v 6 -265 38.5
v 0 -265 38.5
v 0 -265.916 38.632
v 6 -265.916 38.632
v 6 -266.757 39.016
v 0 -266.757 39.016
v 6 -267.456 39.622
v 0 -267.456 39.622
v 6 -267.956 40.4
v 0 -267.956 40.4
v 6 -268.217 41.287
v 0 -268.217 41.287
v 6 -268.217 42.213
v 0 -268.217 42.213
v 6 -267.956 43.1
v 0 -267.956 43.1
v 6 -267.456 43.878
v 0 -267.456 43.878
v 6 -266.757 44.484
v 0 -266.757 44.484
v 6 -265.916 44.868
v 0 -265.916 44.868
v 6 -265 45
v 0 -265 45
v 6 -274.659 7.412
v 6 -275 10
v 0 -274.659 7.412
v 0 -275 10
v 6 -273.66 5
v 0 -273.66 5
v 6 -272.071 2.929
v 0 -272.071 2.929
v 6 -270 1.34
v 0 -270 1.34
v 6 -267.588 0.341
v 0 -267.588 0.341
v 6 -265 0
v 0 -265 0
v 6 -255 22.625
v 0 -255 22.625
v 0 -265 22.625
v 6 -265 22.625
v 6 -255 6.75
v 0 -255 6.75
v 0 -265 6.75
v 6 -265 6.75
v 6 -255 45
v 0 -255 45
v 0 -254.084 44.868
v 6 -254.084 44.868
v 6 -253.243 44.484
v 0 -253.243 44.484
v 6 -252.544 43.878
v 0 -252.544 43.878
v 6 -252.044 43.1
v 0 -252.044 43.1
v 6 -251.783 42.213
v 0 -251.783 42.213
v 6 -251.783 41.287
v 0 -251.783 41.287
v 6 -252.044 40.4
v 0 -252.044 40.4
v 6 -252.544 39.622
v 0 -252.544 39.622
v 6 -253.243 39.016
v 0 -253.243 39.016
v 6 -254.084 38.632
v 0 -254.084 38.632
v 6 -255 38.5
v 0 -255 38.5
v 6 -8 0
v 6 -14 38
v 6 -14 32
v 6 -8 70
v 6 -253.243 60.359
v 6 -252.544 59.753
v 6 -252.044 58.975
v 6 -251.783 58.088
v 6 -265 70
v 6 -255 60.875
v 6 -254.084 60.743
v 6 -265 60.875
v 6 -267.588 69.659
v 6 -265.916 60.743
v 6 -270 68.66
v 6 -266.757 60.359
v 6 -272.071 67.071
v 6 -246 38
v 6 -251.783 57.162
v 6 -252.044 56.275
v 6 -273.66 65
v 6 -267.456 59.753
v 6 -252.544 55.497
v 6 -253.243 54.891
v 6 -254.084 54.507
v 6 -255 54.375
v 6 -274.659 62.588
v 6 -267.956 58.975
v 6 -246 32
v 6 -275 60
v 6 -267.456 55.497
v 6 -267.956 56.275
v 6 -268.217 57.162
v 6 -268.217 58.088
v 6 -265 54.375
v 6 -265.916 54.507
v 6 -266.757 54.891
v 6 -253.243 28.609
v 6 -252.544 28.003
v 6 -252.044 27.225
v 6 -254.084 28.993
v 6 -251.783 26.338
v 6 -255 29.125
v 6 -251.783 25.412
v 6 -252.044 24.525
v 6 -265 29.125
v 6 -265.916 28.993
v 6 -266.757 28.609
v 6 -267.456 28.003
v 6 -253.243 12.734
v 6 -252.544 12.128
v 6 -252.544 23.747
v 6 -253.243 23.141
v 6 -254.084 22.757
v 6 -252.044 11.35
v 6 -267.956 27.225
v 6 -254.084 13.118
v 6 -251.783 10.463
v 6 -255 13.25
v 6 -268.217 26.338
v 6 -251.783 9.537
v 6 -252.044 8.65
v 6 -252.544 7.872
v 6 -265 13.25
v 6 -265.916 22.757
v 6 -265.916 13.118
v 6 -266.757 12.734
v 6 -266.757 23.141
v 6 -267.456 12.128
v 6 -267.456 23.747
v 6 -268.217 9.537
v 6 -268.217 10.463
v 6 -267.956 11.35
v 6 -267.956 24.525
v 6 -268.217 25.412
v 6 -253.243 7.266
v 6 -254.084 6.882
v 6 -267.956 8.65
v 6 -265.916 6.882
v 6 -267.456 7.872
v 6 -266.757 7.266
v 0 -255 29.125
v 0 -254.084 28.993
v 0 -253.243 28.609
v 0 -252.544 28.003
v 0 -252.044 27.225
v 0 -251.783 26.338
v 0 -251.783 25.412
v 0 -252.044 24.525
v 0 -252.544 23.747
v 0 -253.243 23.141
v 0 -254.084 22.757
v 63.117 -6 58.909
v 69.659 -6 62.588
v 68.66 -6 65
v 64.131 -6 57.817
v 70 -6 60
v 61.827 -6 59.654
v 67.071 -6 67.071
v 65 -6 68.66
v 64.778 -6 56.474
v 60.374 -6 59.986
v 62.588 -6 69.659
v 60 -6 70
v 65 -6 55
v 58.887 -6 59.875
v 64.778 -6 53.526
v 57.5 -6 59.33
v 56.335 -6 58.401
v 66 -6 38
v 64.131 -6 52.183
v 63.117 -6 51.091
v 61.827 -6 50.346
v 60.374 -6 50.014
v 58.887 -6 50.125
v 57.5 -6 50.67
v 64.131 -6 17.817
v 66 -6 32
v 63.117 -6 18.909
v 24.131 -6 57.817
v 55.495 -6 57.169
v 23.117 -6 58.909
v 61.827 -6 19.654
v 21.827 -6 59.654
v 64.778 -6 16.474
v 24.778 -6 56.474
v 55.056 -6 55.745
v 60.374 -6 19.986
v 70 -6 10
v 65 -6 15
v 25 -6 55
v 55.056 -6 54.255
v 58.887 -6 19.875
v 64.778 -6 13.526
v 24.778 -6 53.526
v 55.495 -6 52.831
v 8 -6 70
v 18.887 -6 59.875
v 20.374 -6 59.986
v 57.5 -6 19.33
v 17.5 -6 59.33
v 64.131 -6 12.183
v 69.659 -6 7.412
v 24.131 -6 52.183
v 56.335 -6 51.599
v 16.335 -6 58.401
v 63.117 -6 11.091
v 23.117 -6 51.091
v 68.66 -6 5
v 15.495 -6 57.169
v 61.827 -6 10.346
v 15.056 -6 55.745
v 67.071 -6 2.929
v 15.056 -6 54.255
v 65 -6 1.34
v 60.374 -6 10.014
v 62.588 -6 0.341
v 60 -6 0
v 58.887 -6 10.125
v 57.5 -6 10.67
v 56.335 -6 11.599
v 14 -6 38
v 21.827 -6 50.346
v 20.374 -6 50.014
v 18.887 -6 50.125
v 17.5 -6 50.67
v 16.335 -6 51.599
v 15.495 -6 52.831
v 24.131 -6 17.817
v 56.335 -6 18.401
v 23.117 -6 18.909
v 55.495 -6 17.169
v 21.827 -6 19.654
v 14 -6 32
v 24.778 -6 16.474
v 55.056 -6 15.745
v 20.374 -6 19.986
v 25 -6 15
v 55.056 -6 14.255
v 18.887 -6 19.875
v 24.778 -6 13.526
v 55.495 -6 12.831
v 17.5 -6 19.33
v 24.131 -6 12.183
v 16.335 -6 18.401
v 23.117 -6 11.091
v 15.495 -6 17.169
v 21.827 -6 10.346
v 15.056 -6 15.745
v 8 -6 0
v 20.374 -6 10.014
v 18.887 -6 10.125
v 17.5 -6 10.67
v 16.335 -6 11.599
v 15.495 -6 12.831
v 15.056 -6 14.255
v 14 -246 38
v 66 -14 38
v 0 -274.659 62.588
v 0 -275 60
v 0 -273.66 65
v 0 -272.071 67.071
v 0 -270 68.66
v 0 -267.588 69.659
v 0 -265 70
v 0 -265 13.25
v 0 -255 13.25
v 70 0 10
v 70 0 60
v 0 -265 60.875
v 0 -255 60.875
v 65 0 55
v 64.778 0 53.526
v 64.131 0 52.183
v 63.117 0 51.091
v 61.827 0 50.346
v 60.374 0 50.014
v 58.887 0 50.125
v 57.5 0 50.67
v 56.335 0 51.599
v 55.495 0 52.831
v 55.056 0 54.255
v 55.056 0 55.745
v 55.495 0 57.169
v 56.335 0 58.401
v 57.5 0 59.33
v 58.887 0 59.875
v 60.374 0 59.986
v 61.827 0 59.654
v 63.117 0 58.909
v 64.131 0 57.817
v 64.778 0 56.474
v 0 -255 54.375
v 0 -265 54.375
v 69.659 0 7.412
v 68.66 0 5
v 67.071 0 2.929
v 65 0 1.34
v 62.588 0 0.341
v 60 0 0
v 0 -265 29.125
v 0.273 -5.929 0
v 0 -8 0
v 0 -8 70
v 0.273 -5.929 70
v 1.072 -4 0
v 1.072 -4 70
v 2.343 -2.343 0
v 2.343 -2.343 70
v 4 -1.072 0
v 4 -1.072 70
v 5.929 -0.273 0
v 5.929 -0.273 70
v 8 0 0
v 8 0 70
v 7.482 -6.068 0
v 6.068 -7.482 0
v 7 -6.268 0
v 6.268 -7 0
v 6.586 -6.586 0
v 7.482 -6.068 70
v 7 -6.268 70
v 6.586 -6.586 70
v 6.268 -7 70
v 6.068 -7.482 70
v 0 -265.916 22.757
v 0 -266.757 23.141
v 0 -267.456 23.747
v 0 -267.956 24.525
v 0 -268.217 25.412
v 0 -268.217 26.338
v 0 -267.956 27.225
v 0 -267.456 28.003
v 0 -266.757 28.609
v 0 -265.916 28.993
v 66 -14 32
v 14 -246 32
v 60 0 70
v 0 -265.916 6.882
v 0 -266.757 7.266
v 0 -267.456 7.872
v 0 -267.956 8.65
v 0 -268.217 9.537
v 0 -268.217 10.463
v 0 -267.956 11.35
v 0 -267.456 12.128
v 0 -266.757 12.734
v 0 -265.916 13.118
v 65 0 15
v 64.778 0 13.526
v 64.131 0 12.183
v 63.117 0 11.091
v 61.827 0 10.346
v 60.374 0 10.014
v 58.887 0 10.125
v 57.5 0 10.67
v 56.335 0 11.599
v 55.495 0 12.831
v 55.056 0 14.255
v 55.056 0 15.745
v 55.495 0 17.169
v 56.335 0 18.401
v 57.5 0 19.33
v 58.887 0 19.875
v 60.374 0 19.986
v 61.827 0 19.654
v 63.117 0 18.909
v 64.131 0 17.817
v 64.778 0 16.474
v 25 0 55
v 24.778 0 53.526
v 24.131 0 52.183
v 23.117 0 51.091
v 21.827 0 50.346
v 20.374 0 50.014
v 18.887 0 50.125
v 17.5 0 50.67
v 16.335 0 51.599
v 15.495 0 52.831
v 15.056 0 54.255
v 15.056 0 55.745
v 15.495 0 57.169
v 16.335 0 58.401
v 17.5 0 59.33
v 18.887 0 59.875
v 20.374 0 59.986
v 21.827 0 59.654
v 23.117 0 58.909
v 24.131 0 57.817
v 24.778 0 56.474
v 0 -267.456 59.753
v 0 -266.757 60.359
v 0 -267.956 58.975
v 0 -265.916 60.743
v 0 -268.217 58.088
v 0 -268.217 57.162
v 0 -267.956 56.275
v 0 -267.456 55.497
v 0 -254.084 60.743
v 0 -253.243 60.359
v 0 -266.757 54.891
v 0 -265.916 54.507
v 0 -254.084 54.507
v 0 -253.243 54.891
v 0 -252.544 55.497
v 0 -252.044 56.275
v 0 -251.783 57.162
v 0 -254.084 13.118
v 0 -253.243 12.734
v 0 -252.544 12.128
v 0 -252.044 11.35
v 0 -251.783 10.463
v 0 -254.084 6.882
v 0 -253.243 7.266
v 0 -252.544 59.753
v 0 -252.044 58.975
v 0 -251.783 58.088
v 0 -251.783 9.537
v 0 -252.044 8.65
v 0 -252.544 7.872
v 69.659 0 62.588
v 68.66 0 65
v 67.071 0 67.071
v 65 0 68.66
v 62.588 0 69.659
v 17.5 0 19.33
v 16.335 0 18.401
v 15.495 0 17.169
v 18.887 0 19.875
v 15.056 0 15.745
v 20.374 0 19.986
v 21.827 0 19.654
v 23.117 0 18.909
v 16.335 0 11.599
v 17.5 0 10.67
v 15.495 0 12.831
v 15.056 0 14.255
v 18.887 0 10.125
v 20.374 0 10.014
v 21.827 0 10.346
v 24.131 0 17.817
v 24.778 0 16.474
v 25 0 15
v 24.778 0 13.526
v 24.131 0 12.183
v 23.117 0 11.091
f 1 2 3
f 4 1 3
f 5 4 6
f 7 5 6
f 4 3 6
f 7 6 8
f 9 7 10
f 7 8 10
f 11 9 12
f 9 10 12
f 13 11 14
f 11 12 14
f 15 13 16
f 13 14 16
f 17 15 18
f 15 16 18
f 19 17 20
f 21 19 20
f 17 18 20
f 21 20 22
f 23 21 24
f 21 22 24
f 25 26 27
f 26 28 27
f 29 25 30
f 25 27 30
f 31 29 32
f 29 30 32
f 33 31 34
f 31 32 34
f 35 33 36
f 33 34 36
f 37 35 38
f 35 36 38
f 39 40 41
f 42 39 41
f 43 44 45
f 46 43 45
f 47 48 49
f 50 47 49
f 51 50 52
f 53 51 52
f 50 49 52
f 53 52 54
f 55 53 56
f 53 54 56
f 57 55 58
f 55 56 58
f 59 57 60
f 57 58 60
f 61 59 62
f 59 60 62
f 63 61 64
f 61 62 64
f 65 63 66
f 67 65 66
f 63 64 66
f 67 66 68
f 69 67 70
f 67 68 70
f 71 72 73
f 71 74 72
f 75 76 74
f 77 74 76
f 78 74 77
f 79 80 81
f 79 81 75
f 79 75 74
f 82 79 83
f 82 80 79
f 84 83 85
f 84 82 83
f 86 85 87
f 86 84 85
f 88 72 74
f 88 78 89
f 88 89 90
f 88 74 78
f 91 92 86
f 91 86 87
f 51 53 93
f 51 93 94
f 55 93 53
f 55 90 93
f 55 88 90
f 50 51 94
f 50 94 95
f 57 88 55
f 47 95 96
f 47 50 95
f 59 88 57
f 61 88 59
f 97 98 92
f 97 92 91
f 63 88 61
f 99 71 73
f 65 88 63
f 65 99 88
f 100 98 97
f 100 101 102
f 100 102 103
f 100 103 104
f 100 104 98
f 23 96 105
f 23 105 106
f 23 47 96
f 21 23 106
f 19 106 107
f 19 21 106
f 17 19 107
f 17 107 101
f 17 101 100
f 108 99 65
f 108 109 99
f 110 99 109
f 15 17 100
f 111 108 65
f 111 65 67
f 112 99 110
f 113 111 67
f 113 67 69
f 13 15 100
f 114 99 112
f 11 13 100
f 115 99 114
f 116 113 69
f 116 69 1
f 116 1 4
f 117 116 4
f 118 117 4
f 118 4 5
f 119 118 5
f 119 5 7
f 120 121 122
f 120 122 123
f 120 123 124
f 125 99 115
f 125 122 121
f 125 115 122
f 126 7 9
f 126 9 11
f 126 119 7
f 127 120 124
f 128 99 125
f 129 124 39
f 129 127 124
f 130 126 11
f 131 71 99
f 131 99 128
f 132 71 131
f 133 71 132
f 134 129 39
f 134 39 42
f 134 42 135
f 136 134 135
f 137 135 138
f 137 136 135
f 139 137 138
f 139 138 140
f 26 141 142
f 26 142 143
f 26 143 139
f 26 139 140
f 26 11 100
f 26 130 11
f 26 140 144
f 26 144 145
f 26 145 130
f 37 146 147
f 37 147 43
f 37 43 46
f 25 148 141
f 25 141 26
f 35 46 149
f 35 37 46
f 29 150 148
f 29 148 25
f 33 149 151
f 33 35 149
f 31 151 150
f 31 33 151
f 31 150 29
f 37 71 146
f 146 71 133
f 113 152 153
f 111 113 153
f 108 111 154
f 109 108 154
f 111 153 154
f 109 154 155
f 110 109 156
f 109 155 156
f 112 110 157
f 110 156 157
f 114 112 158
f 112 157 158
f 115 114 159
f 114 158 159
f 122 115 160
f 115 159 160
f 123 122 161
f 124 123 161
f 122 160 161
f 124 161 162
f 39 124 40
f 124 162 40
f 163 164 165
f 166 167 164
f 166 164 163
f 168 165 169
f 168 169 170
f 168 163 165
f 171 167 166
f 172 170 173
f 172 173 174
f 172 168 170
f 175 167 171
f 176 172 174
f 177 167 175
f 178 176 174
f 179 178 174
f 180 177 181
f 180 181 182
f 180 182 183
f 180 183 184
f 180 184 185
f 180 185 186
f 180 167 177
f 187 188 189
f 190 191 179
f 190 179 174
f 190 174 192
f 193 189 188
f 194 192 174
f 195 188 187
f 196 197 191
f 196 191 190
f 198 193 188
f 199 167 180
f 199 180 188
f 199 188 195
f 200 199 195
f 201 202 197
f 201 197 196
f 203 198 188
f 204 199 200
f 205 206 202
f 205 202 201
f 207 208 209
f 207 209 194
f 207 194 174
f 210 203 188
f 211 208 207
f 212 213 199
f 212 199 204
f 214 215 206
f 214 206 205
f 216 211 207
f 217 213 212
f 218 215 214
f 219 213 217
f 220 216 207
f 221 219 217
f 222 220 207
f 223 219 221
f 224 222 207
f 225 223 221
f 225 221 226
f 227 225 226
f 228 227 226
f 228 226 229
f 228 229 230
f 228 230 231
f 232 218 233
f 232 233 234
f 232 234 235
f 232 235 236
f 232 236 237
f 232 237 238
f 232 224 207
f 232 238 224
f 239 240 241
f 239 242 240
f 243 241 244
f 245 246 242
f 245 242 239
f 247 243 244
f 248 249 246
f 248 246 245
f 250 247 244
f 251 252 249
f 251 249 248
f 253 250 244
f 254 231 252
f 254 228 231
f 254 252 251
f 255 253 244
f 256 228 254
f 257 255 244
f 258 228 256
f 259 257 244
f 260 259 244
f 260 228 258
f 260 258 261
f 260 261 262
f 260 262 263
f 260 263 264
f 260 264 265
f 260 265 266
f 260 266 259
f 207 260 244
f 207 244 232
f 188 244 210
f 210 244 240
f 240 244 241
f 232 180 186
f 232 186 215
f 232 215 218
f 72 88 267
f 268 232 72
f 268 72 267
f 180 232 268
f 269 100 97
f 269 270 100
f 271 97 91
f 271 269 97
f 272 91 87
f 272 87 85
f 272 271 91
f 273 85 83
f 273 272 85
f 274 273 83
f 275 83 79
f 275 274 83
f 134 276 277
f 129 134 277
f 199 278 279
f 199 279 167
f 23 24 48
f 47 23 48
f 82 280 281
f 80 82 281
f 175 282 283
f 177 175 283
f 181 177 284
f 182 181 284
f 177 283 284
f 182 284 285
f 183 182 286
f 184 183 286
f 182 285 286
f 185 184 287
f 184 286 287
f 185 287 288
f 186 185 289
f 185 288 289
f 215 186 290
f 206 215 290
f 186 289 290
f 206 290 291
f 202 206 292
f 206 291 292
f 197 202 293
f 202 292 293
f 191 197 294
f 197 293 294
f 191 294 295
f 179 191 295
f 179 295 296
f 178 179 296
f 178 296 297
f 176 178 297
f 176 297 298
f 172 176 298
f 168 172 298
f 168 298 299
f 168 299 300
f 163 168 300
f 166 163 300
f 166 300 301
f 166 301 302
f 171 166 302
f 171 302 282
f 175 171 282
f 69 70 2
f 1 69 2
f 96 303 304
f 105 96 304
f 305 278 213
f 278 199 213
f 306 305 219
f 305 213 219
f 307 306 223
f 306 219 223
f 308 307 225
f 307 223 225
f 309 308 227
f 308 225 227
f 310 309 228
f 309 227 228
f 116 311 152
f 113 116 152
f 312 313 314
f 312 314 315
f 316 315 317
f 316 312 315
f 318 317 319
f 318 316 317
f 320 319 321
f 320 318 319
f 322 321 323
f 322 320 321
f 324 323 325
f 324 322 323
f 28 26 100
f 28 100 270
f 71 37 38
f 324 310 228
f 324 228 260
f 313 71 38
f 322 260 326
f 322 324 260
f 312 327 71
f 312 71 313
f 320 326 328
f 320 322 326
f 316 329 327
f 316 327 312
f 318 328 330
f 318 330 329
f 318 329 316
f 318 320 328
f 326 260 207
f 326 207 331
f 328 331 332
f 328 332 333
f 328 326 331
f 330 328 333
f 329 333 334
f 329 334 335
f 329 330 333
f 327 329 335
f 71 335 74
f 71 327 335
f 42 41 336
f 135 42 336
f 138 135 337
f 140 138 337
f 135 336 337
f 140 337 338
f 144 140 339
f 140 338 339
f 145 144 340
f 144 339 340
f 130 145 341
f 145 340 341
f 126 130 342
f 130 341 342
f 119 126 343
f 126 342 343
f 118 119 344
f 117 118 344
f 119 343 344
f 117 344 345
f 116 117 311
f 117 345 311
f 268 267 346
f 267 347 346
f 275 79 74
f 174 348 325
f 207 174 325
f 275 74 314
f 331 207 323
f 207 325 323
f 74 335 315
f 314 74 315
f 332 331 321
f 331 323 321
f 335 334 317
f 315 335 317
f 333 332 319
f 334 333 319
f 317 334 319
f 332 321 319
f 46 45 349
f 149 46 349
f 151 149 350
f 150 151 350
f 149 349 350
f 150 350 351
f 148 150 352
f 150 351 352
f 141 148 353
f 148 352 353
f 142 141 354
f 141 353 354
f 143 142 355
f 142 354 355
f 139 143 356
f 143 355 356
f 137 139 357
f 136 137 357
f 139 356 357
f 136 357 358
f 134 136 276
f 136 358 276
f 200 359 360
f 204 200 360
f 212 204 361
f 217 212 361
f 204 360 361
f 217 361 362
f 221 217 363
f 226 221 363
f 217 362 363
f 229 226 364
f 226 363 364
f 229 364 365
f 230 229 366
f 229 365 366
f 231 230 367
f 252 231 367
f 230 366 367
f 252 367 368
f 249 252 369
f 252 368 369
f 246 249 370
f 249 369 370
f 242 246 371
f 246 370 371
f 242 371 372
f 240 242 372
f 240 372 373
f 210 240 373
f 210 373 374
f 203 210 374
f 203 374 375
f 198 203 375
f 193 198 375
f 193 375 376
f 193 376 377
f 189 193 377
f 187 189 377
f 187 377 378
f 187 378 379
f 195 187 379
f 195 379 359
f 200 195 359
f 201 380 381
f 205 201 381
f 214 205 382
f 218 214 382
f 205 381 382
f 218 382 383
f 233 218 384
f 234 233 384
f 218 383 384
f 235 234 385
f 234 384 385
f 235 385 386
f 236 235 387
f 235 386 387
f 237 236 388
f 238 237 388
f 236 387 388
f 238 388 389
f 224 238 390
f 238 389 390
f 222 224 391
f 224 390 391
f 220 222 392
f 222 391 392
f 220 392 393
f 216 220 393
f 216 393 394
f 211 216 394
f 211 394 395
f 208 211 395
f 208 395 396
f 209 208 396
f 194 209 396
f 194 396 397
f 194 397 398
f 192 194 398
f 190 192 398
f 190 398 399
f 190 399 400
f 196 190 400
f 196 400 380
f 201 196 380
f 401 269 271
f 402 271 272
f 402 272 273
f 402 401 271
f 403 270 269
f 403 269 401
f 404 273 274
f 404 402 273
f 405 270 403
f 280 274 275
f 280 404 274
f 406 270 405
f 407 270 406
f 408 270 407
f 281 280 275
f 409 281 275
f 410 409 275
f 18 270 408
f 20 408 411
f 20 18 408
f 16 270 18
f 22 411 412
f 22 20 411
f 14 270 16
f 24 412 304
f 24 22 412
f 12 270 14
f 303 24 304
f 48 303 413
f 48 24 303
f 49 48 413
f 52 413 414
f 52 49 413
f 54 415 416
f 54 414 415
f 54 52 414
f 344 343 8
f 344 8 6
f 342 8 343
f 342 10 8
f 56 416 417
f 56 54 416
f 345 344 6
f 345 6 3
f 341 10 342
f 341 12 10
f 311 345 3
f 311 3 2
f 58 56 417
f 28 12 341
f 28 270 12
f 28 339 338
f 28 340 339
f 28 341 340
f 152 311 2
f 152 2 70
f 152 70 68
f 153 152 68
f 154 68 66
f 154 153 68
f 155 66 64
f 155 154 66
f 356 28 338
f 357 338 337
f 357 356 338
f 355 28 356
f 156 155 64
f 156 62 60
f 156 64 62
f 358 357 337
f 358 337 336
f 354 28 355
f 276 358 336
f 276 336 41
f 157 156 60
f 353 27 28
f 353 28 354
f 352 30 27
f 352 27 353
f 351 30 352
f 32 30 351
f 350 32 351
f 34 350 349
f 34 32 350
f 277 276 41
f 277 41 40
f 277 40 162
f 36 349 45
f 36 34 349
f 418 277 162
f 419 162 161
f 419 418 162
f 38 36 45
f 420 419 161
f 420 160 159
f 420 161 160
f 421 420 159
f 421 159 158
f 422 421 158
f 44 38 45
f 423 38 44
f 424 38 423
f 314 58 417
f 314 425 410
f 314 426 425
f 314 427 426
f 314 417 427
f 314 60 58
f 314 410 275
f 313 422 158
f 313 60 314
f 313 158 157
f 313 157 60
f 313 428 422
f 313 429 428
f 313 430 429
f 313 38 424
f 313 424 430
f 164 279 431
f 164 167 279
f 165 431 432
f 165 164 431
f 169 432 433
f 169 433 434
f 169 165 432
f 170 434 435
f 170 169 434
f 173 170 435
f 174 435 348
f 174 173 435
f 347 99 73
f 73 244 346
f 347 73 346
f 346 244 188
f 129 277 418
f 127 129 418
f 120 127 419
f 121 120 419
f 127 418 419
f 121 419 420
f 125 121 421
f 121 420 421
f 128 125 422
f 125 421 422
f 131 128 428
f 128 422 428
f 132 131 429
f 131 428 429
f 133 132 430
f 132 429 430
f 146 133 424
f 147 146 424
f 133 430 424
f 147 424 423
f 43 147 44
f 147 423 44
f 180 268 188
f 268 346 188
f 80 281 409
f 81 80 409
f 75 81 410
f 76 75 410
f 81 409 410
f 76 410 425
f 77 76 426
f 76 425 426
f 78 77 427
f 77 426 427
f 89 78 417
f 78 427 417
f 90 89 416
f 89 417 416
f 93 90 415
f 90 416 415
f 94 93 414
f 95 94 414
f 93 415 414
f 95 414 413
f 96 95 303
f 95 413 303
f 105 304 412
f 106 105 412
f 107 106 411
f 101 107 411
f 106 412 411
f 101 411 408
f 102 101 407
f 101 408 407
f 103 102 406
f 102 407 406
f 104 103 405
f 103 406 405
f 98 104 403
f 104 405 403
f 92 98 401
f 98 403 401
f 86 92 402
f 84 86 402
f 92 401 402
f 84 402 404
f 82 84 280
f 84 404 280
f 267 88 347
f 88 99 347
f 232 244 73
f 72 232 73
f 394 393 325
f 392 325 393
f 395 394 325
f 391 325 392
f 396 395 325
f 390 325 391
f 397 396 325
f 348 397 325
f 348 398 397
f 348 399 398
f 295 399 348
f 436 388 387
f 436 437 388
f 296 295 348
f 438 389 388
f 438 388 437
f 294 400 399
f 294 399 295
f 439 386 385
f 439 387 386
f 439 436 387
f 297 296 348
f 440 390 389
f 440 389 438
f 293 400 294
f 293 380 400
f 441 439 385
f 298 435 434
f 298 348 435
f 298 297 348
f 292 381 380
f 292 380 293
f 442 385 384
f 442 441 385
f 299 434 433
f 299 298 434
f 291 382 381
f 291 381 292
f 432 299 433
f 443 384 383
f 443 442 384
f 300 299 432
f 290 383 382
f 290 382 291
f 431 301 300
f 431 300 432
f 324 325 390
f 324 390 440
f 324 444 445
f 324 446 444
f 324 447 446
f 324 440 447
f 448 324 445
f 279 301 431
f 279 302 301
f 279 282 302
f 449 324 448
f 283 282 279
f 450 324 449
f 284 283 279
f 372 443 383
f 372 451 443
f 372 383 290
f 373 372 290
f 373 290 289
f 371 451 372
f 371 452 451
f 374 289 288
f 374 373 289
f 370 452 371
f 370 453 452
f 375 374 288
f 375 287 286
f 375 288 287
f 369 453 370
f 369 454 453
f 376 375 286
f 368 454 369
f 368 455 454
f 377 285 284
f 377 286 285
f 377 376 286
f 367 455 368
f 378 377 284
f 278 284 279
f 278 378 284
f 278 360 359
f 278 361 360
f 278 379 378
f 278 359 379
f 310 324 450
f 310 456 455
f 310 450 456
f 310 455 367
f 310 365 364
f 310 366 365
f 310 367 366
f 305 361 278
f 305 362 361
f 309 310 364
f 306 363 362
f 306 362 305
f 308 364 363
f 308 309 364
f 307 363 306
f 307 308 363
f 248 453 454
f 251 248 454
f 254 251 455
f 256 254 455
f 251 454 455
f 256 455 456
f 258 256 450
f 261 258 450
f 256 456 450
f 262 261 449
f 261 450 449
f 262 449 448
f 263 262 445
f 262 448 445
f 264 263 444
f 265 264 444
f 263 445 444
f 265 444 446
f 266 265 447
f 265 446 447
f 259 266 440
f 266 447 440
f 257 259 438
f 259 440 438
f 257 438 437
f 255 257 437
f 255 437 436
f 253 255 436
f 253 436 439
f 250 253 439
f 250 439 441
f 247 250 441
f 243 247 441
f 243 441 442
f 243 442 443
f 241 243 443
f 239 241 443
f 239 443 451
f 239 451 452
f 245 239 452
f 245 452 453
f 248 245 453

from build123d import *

# Parameters (mm, degrees)
EXTRUDE_1_DEPTH     = 70
FILLET_1_R          = 10
CUT_EXTRUDE_1_REACH = 72
CUT_EXTRUDE_2_REACH = 277
SKETCH_3_R          = 5
EXTRUDE_2_DEPTH     = 3


with BuildPart() as part:
    # 草图1 → 凸台-拉伸1 (new body)
    with BuildSketch(Plane.XY):
        with BuildLine():
            Line((8, 0), (70, 0))
            Line((70, 0), (70, -6))
            Line((70, -6), (8, -6))
            ThreePointArc((8, -6), (6.585786438, -6.585786438), (6, -8))
            Line((6, -8), (6, -275))
            Line((6, -275), (0, -275))
            Line((0, -275), (0, -8))
            ThreePointArc((0, -8), (2.343145751, -2.343145751), (8, 0))
        make_face()
    extrude(amount=EXTRUDE_1_DEPTH)

    # 圆角1
    fillet_1_edges = [part.edges().sort_by_distance(p)[0] for p in [
        (70, -3, 0),
        (3, -275, 70),
        (70, -3, 70),
        (3, -275, 0),
    ]]
    fillet(fillet_1_edges, radius=FILLET_1_R)

    # 草图2 → 切除-拉伸1 (cut, up to next)
    with BuildSketch(Plane.ZY, mode=Mode.PRIVATE) as cut_extrude_1_sk1:
        with BuildLine():
            Line((6.75, -255), (6.75, -265))
            ThreePointArc((6.75, -265), (10, -268.25), (13.25, -265))
            Line((13.25, -265), (13.25, -255))
            ThreePointArc((13.25, -255), (10, -251.75), (6.75, -255))
        make_face()
    cut_extrude_1_tool1 = extrude(cut_extrude_1_sk1.sketch, amount=-CUT_EXTRUDE_1_REACH, mode=Mode.PRIVATE) & part.part
    add(cut_extrude_1_tool1.solids().sort_by_distance((0, -260, 10))[0], mode=Mode.SUBTRACT)
    # 草图2 → 切除-拉伸1 (cut, up to next)
    with BuildSketch(Plane.ZY, mode=Mode.PRIVATE) as cut_extrude_1_sk2:
        with BuildLine():
            Line((22.625, -255), (22.625, -265))
            ThreePointArc((22.625, -265), (25.875, -268.25), (29.125, -265))
            Line((29.125, -265), (29.125, -255))
            ThreePointArc((29.125, -255), (25.875, -251.75), (22.625, -255))
        make_face()
    cut_extrude_1_tool2 = extrude(cut_extrude_1_sk2.sketch, amount=-CUT_EXTRUDE_1_REACH, mode=Mode.PRIVATE) & part.part
    add(cut_extrude_1_tool2.solids().sort_by_distance((0, -260, 25.875))[0], mode=Mode.SUBTRACT)
    # 草图2 → 切除-拉伸1 (cut, up to next)
    with BuildSketch(Plane.ZY, mode=Mode.PRIVATE) as cut_extrude_1_sk3:
        with BuildLine():
            Line((38.5, -255), (38.5, -265))
            ThreePointArc((38.5, -265), (41.75, -268.25), (45, -265))
            Line((45, -265), (45, -255))
            ThreePointArc((45, -255), (41.75, -251.75), (38.5, -255))
        make_face()
    cut_extrude_1_tool3 = extrude(cut_extrude_1_sk3.sketch, amount=-CUT_EXTRUDE_1_REACH, mode=Mode.PRIVATE) & part.part
    add(cut_extrude_1_tool3.solids().sort_by_distance((0, -260, 41.75))[0], mode=Mode.SUBTRACT)
    # 草图2 → 切除-拉伸1 (cut, up to next)
    with BuildSketch(Plane.ZY, mode=Mode.PRIVATE) as cut_extrude_1_sk4:
        with BuildLine():
            Line((54.375, -255), (54.375, -265))
            ThreePointArc((54.375, -265), (57.625, -268.25), (60.875, -265))
            Line((60.875, -265), (60.875, -255))
            ThreePointArc((60.875, -255), (57.625, -251.75), (54.375, -255))
        make_face()
    cut_extrude_1_tool4 = extrude(cut_extrude_1_sk4.sketch, amount=-CUT_EXTRUDE_1_REACH, mode=Mode.PRIVATE) & part.part
    add(cut_extrude_1_tool4.solids().sort_by_distance((0, -260, 57.625))[0], mode=Mode.SUBTRACT)

    # 草图3 → 切除-拉伸2 (cut, up to next)
    with BuildSketch(Plane(origin=(0, 0, 0), x_dir=(1, 0, 0), z_dir=(0, 1, 0)), mode=Mode.PRIVATE) as cut_extrude_2_sk1:
        with Locations((60, -15)):
            Circle(SKETCH_3_R)
    cut_extrude_2_tool1 = extrude(cut_extrude_2_sk1.sketch, amount=-CUT_EXTRUDE_2_REACH, mode=Mode.PRIVATE) & part.part
    add(cut_extrude_2_tool1.solids().sort_by_distance((60, 0, 15))[0], mode=Mode.SUBTRACT)
    # 草图3 → 切除-拉伸2 (cut, up to next)
    with BuildSketch(Plane(origin=(0, 0, 0), x_dir=(1, 0, 0), z_dir=(0, 1, 0)), mode=Mode.PRIVATE) as cut_extrude_2_sk2:
        with Locations((20, -15)):
            Circle(SKETCH_3_R)
    cut_extrude_2_tool2 = extrude(cut_extrude_2_sk2.sketch, amount=-CUT_EXTRUDE_2_REACH, mode=Mode.PRIVATE) & part.part
    add(cut_extrude_2_tool2.solids().sort_by_distance((20, 0, 15))[0], mode=Mode.SUBTRACT)
    # 草图3 → 切除-拉伸2 (cut, up to next)
    with BuildSketch(Plane(origin=(0, 0, 0), x_dir=(1, 0, 0), z_dir=(0, 1, 0)), mode=Mode.PRIVATE) as cut_extrude_2_sk3:
        with Locations((20, -55)):
            Circle(SKETCH_3_R)
    cut_extrude_2_tool3 = extrude(cut_extrude_2_sk3.sketch, amount=-CUT_EXTRUDE_2_REACH, mode=Mode.PRIVATE) & part.part
    add(cut_extrude_2_tool3.solids().sort_by_distance((20, 0, 55))[0], mode=Mode.SUBTRACT)
    # 草图3 → 切除-拉伸2 (cut, up to next)
    with BuildSketch(Plane(origin=(0, 0, 0), x_dir=(1, 0, 0), z_dir=(0, 1, 0)), mode=Mode.PRIVATE) as cut_extrude_2_sk4:
        with Locations((60, -55)):
            Circle(SKETCH_3_R)
    cut_extrude_2_tool4 = extrude(cut_extrude_2_sk4.sketch, amount=-CUT_EXTRUDE_2_REACH, mode=Mode.PRIVATE) & part.part
    add(cut_extrude_2_tool4.solids().sort_by_distance((60, 0, 55))[0], mode=Mode.SUBTRACT)

    # 草图4 → 凸台-拉伸2 (add, symmetric)
    with BuildSketch(Plane(origin=(0, 0, 35), x_dir=(-1, 0, 0), z_dir=(0, 0, -1))):
        Polygon((-6, -14), (-6, -246), (-14, -246), (-66, -14), (-66, -6), (-14, -6), align=None)
    extrude(amount=EXTRUDE_2_DEPTH, both=True)


solid = part.part
